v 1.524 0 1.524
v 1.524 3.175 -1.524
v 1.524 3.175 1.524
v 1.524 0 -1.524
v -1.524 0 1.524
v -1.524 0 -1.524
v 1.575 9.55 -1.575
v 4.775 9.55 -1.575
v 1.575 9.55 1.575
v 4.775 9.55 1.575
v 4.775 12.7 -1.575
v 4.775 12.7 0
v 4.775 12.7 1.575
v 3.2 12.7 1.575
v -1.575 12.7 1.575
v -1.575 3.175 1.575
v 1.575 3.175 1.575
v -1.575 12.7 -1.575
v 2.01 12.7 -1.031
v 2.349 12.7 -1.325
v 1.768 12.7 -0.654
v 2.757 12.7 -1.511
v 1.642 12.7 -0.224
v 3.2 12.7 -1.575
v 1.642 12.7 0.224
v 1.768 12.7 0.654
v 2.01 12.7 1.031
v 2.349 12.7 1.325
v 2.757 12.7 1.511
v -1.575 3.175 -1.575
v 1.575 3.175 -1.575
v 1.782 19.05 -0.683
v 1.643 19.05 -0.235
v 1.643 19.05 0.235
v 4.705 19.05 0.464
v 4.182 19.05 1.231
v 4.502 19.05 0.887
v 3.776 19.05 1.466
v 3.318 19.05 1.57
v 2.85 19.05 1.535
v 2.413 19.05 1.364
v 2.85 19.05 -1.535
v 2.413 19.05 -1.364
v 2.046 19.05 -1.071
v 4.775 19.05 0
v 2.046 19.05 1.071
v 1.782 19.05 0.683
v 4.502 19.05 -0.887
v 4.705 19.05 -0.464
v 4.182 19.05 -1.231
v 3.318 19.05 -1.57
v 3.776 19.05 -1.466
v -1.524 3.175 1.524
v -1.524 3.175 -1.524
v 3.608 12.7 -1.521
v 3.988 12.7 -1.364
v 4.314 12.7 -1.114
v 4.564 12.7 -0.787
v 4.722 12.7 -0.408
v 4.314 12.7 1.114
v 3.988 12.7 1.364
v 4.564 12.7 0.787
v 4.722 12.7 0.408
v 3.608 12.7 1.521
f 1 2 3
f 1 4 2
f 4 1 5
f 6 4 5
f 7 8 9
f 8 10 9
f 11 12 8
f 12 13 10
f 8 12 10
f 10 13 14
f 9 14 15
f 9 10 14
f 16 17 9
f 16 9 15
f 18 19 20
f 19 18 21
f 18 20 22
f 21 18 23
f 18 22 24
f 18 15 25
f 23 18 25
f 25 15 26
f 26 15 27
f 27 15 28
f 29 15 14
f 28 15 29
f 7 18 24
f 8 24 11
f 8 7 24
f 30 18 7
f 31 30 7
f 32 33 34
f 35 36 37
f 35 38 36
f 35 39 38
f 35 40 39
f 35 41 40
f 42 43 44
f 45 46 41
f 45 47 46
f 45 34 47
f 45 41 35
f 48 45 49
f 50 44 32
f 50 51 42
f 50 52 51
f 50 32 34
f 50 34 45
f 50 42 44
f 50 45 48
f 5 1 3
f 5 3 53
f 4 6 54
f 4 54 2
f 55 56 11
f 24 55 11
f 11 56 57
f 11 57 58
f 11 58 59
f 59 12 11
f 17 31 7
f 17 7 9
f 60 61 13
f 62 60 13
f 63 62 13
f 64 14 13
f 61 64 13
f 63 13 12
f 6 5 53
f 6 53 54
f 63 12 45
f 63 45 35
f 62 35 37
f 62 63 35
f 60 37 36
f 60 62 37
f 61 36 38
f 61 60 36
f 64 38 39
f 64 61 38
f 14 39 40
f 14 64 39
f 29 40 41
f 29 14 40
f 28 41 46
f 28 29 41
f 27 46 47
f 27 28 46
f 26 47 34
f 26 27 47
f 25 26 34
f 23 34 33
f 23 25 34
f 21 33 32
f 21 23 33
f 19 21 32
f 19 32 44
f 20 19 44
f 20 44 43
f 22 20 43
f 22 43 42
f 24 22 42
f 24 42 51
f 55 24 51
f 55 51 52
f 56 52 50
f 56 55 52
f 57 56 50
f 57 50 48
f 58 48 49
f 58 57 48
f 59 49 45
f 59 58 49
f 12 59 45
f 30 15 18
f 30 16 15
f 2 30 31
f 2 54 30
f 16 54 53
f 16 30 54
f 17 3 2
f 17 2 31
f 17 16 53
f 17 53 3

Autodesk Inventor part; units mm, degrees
ref_plane "YZ Plane" through (0, 0, 0) normal (1, 0, 0) x (0, 1, 0)
ref_plane "XZ Plane" through (0, 0, 0) normal (0, 1, 0) x (-1, 0, 0)
ref_plane "XY Plane" through (0, 0, 0) normal (0, 0, 1) x (1, 0, 0)
sketch "Sketch1" plane through (0, 0, 0) normal (0, 1, 0) x (-1, 0, 0)
  line L0 (-1.5748, 1.5748) -> (1.5748, 1.5748)
  line L1 (1.5748, 1.5748) -> (1.5748, -1.5748)
  line L2 (1.5748, -1.5748) -> (-1.5748, -1.5748)
  line L3 (-1.5748, -1.5748) -> (-1.5748, 1.5748)
  line L4 (-1.5748, 1.5748) -> (1.5748, -1.5748) construction
  line L5 (1.5748, 1.5748) -> (-1.5748, -1.5748) construction
  point P0 (0, 0)
  dimension "d0" = 3.1496
  dimension "d1" = 3.1496
extrude "Extrusion1" add sketch "Sketch1" along normal blind 6.35
sketch "Sketch2" plane through (-1.5748, 0, 1.5748) normal (0, 0, 1) x (1, 0, 0)
  line L0 (3.1496, 0) -> (0, 0) projected
  line L1 (3.1496, 0) -> (0, 0)
  line L2 (0, 0) -> (0, 12.7)
  line L3 (0, 12.7) -> (3.1496, 12.7)
  line L4 (3.1496, 12.7) -> (3.1496, 0)
  line L5 (0, 12.7) -> (6.35, 12.7)
  line L6 (6.35, 12.7) -> (6.35, 9.5504)
  line L7 (6.35, 9.5504) -> (0, 9.5504)
  line L8 (0, 9.5504) -> (0, 12.7)
  point P0 (1.5748, 0)
  point P1 (3.1496, 9.5504)
  dimension "d4" = 12.7
  dimension "d5" = 6.35
  dimension "d6" = 3.1496
extrude "Extrusion2" add sketch "Sketch2" against normal blind 3.1496
sketch "Sketch3" plane through (-1.5748, 12.7, 1.5748) normal (0, 1, 0) x (1, 0, 0)
  line L0 (0, 3.1496) -> (6.35, 3.1496) projected
  line L1 (6.35, 3.1496) -> (3.2004, 3.1496)
  line L2 (3.2004, 3.1496) -> (3.2004, 0)
  line L3 (3.2004, 0) -> (6.35, 0)
  line L4 (6.35, 0) -> (6.35, 3.1496)
  circle A0 centre (4.7752, 1.5748) radius 1.5748
  point P0 (1.5748, 1.5748)
  dimension "d9" = 3.1496
  dimension "d10" = 3.1496
extrude "Extrusion3" add sketch "Sketch3" along normal blind 6.35 contours A0
sketch "Sketch4" plane through (0, 0, 0) normal (0, -1, 0) x (1, 0, 0)
  line L0 (1.5748, -1.5748) -> (-1.5748, -1.5748) projected
  line L1 (1.5748, 1.5748) -> (1.5748, -1.5748) projected
  line L2 (1.6002, 1.5748) -> (-1.5748, 1.5748) projected
  line L3 (-1.5748, -1.5748) -> (-1.5748, 1.5748) projected
  line L4 (1.524, 1.524) -> (-1.524, 1.524)
  line L5 (-1.524, 1.524) -> (-1.524, -1.524)
  line L6 (-1.524, -1.524) -> (1.524, -1.524)
  line L7 (1.524, -1.524) -> (1.524, 1.524)
  line L8 (1.524, 1.524) -> (-1.524, -1.524) construction
  line L9 (-1.524, 1.524) -> (1.524, -1.524) construction
  point P0 (0, 0)
  dimension "d13" = 3.048
  dimension "d14" = 3.048
extrude "Extrusion4" cut sketch "Sketch4" against normal blind 3.175
properties part number "Handle"
